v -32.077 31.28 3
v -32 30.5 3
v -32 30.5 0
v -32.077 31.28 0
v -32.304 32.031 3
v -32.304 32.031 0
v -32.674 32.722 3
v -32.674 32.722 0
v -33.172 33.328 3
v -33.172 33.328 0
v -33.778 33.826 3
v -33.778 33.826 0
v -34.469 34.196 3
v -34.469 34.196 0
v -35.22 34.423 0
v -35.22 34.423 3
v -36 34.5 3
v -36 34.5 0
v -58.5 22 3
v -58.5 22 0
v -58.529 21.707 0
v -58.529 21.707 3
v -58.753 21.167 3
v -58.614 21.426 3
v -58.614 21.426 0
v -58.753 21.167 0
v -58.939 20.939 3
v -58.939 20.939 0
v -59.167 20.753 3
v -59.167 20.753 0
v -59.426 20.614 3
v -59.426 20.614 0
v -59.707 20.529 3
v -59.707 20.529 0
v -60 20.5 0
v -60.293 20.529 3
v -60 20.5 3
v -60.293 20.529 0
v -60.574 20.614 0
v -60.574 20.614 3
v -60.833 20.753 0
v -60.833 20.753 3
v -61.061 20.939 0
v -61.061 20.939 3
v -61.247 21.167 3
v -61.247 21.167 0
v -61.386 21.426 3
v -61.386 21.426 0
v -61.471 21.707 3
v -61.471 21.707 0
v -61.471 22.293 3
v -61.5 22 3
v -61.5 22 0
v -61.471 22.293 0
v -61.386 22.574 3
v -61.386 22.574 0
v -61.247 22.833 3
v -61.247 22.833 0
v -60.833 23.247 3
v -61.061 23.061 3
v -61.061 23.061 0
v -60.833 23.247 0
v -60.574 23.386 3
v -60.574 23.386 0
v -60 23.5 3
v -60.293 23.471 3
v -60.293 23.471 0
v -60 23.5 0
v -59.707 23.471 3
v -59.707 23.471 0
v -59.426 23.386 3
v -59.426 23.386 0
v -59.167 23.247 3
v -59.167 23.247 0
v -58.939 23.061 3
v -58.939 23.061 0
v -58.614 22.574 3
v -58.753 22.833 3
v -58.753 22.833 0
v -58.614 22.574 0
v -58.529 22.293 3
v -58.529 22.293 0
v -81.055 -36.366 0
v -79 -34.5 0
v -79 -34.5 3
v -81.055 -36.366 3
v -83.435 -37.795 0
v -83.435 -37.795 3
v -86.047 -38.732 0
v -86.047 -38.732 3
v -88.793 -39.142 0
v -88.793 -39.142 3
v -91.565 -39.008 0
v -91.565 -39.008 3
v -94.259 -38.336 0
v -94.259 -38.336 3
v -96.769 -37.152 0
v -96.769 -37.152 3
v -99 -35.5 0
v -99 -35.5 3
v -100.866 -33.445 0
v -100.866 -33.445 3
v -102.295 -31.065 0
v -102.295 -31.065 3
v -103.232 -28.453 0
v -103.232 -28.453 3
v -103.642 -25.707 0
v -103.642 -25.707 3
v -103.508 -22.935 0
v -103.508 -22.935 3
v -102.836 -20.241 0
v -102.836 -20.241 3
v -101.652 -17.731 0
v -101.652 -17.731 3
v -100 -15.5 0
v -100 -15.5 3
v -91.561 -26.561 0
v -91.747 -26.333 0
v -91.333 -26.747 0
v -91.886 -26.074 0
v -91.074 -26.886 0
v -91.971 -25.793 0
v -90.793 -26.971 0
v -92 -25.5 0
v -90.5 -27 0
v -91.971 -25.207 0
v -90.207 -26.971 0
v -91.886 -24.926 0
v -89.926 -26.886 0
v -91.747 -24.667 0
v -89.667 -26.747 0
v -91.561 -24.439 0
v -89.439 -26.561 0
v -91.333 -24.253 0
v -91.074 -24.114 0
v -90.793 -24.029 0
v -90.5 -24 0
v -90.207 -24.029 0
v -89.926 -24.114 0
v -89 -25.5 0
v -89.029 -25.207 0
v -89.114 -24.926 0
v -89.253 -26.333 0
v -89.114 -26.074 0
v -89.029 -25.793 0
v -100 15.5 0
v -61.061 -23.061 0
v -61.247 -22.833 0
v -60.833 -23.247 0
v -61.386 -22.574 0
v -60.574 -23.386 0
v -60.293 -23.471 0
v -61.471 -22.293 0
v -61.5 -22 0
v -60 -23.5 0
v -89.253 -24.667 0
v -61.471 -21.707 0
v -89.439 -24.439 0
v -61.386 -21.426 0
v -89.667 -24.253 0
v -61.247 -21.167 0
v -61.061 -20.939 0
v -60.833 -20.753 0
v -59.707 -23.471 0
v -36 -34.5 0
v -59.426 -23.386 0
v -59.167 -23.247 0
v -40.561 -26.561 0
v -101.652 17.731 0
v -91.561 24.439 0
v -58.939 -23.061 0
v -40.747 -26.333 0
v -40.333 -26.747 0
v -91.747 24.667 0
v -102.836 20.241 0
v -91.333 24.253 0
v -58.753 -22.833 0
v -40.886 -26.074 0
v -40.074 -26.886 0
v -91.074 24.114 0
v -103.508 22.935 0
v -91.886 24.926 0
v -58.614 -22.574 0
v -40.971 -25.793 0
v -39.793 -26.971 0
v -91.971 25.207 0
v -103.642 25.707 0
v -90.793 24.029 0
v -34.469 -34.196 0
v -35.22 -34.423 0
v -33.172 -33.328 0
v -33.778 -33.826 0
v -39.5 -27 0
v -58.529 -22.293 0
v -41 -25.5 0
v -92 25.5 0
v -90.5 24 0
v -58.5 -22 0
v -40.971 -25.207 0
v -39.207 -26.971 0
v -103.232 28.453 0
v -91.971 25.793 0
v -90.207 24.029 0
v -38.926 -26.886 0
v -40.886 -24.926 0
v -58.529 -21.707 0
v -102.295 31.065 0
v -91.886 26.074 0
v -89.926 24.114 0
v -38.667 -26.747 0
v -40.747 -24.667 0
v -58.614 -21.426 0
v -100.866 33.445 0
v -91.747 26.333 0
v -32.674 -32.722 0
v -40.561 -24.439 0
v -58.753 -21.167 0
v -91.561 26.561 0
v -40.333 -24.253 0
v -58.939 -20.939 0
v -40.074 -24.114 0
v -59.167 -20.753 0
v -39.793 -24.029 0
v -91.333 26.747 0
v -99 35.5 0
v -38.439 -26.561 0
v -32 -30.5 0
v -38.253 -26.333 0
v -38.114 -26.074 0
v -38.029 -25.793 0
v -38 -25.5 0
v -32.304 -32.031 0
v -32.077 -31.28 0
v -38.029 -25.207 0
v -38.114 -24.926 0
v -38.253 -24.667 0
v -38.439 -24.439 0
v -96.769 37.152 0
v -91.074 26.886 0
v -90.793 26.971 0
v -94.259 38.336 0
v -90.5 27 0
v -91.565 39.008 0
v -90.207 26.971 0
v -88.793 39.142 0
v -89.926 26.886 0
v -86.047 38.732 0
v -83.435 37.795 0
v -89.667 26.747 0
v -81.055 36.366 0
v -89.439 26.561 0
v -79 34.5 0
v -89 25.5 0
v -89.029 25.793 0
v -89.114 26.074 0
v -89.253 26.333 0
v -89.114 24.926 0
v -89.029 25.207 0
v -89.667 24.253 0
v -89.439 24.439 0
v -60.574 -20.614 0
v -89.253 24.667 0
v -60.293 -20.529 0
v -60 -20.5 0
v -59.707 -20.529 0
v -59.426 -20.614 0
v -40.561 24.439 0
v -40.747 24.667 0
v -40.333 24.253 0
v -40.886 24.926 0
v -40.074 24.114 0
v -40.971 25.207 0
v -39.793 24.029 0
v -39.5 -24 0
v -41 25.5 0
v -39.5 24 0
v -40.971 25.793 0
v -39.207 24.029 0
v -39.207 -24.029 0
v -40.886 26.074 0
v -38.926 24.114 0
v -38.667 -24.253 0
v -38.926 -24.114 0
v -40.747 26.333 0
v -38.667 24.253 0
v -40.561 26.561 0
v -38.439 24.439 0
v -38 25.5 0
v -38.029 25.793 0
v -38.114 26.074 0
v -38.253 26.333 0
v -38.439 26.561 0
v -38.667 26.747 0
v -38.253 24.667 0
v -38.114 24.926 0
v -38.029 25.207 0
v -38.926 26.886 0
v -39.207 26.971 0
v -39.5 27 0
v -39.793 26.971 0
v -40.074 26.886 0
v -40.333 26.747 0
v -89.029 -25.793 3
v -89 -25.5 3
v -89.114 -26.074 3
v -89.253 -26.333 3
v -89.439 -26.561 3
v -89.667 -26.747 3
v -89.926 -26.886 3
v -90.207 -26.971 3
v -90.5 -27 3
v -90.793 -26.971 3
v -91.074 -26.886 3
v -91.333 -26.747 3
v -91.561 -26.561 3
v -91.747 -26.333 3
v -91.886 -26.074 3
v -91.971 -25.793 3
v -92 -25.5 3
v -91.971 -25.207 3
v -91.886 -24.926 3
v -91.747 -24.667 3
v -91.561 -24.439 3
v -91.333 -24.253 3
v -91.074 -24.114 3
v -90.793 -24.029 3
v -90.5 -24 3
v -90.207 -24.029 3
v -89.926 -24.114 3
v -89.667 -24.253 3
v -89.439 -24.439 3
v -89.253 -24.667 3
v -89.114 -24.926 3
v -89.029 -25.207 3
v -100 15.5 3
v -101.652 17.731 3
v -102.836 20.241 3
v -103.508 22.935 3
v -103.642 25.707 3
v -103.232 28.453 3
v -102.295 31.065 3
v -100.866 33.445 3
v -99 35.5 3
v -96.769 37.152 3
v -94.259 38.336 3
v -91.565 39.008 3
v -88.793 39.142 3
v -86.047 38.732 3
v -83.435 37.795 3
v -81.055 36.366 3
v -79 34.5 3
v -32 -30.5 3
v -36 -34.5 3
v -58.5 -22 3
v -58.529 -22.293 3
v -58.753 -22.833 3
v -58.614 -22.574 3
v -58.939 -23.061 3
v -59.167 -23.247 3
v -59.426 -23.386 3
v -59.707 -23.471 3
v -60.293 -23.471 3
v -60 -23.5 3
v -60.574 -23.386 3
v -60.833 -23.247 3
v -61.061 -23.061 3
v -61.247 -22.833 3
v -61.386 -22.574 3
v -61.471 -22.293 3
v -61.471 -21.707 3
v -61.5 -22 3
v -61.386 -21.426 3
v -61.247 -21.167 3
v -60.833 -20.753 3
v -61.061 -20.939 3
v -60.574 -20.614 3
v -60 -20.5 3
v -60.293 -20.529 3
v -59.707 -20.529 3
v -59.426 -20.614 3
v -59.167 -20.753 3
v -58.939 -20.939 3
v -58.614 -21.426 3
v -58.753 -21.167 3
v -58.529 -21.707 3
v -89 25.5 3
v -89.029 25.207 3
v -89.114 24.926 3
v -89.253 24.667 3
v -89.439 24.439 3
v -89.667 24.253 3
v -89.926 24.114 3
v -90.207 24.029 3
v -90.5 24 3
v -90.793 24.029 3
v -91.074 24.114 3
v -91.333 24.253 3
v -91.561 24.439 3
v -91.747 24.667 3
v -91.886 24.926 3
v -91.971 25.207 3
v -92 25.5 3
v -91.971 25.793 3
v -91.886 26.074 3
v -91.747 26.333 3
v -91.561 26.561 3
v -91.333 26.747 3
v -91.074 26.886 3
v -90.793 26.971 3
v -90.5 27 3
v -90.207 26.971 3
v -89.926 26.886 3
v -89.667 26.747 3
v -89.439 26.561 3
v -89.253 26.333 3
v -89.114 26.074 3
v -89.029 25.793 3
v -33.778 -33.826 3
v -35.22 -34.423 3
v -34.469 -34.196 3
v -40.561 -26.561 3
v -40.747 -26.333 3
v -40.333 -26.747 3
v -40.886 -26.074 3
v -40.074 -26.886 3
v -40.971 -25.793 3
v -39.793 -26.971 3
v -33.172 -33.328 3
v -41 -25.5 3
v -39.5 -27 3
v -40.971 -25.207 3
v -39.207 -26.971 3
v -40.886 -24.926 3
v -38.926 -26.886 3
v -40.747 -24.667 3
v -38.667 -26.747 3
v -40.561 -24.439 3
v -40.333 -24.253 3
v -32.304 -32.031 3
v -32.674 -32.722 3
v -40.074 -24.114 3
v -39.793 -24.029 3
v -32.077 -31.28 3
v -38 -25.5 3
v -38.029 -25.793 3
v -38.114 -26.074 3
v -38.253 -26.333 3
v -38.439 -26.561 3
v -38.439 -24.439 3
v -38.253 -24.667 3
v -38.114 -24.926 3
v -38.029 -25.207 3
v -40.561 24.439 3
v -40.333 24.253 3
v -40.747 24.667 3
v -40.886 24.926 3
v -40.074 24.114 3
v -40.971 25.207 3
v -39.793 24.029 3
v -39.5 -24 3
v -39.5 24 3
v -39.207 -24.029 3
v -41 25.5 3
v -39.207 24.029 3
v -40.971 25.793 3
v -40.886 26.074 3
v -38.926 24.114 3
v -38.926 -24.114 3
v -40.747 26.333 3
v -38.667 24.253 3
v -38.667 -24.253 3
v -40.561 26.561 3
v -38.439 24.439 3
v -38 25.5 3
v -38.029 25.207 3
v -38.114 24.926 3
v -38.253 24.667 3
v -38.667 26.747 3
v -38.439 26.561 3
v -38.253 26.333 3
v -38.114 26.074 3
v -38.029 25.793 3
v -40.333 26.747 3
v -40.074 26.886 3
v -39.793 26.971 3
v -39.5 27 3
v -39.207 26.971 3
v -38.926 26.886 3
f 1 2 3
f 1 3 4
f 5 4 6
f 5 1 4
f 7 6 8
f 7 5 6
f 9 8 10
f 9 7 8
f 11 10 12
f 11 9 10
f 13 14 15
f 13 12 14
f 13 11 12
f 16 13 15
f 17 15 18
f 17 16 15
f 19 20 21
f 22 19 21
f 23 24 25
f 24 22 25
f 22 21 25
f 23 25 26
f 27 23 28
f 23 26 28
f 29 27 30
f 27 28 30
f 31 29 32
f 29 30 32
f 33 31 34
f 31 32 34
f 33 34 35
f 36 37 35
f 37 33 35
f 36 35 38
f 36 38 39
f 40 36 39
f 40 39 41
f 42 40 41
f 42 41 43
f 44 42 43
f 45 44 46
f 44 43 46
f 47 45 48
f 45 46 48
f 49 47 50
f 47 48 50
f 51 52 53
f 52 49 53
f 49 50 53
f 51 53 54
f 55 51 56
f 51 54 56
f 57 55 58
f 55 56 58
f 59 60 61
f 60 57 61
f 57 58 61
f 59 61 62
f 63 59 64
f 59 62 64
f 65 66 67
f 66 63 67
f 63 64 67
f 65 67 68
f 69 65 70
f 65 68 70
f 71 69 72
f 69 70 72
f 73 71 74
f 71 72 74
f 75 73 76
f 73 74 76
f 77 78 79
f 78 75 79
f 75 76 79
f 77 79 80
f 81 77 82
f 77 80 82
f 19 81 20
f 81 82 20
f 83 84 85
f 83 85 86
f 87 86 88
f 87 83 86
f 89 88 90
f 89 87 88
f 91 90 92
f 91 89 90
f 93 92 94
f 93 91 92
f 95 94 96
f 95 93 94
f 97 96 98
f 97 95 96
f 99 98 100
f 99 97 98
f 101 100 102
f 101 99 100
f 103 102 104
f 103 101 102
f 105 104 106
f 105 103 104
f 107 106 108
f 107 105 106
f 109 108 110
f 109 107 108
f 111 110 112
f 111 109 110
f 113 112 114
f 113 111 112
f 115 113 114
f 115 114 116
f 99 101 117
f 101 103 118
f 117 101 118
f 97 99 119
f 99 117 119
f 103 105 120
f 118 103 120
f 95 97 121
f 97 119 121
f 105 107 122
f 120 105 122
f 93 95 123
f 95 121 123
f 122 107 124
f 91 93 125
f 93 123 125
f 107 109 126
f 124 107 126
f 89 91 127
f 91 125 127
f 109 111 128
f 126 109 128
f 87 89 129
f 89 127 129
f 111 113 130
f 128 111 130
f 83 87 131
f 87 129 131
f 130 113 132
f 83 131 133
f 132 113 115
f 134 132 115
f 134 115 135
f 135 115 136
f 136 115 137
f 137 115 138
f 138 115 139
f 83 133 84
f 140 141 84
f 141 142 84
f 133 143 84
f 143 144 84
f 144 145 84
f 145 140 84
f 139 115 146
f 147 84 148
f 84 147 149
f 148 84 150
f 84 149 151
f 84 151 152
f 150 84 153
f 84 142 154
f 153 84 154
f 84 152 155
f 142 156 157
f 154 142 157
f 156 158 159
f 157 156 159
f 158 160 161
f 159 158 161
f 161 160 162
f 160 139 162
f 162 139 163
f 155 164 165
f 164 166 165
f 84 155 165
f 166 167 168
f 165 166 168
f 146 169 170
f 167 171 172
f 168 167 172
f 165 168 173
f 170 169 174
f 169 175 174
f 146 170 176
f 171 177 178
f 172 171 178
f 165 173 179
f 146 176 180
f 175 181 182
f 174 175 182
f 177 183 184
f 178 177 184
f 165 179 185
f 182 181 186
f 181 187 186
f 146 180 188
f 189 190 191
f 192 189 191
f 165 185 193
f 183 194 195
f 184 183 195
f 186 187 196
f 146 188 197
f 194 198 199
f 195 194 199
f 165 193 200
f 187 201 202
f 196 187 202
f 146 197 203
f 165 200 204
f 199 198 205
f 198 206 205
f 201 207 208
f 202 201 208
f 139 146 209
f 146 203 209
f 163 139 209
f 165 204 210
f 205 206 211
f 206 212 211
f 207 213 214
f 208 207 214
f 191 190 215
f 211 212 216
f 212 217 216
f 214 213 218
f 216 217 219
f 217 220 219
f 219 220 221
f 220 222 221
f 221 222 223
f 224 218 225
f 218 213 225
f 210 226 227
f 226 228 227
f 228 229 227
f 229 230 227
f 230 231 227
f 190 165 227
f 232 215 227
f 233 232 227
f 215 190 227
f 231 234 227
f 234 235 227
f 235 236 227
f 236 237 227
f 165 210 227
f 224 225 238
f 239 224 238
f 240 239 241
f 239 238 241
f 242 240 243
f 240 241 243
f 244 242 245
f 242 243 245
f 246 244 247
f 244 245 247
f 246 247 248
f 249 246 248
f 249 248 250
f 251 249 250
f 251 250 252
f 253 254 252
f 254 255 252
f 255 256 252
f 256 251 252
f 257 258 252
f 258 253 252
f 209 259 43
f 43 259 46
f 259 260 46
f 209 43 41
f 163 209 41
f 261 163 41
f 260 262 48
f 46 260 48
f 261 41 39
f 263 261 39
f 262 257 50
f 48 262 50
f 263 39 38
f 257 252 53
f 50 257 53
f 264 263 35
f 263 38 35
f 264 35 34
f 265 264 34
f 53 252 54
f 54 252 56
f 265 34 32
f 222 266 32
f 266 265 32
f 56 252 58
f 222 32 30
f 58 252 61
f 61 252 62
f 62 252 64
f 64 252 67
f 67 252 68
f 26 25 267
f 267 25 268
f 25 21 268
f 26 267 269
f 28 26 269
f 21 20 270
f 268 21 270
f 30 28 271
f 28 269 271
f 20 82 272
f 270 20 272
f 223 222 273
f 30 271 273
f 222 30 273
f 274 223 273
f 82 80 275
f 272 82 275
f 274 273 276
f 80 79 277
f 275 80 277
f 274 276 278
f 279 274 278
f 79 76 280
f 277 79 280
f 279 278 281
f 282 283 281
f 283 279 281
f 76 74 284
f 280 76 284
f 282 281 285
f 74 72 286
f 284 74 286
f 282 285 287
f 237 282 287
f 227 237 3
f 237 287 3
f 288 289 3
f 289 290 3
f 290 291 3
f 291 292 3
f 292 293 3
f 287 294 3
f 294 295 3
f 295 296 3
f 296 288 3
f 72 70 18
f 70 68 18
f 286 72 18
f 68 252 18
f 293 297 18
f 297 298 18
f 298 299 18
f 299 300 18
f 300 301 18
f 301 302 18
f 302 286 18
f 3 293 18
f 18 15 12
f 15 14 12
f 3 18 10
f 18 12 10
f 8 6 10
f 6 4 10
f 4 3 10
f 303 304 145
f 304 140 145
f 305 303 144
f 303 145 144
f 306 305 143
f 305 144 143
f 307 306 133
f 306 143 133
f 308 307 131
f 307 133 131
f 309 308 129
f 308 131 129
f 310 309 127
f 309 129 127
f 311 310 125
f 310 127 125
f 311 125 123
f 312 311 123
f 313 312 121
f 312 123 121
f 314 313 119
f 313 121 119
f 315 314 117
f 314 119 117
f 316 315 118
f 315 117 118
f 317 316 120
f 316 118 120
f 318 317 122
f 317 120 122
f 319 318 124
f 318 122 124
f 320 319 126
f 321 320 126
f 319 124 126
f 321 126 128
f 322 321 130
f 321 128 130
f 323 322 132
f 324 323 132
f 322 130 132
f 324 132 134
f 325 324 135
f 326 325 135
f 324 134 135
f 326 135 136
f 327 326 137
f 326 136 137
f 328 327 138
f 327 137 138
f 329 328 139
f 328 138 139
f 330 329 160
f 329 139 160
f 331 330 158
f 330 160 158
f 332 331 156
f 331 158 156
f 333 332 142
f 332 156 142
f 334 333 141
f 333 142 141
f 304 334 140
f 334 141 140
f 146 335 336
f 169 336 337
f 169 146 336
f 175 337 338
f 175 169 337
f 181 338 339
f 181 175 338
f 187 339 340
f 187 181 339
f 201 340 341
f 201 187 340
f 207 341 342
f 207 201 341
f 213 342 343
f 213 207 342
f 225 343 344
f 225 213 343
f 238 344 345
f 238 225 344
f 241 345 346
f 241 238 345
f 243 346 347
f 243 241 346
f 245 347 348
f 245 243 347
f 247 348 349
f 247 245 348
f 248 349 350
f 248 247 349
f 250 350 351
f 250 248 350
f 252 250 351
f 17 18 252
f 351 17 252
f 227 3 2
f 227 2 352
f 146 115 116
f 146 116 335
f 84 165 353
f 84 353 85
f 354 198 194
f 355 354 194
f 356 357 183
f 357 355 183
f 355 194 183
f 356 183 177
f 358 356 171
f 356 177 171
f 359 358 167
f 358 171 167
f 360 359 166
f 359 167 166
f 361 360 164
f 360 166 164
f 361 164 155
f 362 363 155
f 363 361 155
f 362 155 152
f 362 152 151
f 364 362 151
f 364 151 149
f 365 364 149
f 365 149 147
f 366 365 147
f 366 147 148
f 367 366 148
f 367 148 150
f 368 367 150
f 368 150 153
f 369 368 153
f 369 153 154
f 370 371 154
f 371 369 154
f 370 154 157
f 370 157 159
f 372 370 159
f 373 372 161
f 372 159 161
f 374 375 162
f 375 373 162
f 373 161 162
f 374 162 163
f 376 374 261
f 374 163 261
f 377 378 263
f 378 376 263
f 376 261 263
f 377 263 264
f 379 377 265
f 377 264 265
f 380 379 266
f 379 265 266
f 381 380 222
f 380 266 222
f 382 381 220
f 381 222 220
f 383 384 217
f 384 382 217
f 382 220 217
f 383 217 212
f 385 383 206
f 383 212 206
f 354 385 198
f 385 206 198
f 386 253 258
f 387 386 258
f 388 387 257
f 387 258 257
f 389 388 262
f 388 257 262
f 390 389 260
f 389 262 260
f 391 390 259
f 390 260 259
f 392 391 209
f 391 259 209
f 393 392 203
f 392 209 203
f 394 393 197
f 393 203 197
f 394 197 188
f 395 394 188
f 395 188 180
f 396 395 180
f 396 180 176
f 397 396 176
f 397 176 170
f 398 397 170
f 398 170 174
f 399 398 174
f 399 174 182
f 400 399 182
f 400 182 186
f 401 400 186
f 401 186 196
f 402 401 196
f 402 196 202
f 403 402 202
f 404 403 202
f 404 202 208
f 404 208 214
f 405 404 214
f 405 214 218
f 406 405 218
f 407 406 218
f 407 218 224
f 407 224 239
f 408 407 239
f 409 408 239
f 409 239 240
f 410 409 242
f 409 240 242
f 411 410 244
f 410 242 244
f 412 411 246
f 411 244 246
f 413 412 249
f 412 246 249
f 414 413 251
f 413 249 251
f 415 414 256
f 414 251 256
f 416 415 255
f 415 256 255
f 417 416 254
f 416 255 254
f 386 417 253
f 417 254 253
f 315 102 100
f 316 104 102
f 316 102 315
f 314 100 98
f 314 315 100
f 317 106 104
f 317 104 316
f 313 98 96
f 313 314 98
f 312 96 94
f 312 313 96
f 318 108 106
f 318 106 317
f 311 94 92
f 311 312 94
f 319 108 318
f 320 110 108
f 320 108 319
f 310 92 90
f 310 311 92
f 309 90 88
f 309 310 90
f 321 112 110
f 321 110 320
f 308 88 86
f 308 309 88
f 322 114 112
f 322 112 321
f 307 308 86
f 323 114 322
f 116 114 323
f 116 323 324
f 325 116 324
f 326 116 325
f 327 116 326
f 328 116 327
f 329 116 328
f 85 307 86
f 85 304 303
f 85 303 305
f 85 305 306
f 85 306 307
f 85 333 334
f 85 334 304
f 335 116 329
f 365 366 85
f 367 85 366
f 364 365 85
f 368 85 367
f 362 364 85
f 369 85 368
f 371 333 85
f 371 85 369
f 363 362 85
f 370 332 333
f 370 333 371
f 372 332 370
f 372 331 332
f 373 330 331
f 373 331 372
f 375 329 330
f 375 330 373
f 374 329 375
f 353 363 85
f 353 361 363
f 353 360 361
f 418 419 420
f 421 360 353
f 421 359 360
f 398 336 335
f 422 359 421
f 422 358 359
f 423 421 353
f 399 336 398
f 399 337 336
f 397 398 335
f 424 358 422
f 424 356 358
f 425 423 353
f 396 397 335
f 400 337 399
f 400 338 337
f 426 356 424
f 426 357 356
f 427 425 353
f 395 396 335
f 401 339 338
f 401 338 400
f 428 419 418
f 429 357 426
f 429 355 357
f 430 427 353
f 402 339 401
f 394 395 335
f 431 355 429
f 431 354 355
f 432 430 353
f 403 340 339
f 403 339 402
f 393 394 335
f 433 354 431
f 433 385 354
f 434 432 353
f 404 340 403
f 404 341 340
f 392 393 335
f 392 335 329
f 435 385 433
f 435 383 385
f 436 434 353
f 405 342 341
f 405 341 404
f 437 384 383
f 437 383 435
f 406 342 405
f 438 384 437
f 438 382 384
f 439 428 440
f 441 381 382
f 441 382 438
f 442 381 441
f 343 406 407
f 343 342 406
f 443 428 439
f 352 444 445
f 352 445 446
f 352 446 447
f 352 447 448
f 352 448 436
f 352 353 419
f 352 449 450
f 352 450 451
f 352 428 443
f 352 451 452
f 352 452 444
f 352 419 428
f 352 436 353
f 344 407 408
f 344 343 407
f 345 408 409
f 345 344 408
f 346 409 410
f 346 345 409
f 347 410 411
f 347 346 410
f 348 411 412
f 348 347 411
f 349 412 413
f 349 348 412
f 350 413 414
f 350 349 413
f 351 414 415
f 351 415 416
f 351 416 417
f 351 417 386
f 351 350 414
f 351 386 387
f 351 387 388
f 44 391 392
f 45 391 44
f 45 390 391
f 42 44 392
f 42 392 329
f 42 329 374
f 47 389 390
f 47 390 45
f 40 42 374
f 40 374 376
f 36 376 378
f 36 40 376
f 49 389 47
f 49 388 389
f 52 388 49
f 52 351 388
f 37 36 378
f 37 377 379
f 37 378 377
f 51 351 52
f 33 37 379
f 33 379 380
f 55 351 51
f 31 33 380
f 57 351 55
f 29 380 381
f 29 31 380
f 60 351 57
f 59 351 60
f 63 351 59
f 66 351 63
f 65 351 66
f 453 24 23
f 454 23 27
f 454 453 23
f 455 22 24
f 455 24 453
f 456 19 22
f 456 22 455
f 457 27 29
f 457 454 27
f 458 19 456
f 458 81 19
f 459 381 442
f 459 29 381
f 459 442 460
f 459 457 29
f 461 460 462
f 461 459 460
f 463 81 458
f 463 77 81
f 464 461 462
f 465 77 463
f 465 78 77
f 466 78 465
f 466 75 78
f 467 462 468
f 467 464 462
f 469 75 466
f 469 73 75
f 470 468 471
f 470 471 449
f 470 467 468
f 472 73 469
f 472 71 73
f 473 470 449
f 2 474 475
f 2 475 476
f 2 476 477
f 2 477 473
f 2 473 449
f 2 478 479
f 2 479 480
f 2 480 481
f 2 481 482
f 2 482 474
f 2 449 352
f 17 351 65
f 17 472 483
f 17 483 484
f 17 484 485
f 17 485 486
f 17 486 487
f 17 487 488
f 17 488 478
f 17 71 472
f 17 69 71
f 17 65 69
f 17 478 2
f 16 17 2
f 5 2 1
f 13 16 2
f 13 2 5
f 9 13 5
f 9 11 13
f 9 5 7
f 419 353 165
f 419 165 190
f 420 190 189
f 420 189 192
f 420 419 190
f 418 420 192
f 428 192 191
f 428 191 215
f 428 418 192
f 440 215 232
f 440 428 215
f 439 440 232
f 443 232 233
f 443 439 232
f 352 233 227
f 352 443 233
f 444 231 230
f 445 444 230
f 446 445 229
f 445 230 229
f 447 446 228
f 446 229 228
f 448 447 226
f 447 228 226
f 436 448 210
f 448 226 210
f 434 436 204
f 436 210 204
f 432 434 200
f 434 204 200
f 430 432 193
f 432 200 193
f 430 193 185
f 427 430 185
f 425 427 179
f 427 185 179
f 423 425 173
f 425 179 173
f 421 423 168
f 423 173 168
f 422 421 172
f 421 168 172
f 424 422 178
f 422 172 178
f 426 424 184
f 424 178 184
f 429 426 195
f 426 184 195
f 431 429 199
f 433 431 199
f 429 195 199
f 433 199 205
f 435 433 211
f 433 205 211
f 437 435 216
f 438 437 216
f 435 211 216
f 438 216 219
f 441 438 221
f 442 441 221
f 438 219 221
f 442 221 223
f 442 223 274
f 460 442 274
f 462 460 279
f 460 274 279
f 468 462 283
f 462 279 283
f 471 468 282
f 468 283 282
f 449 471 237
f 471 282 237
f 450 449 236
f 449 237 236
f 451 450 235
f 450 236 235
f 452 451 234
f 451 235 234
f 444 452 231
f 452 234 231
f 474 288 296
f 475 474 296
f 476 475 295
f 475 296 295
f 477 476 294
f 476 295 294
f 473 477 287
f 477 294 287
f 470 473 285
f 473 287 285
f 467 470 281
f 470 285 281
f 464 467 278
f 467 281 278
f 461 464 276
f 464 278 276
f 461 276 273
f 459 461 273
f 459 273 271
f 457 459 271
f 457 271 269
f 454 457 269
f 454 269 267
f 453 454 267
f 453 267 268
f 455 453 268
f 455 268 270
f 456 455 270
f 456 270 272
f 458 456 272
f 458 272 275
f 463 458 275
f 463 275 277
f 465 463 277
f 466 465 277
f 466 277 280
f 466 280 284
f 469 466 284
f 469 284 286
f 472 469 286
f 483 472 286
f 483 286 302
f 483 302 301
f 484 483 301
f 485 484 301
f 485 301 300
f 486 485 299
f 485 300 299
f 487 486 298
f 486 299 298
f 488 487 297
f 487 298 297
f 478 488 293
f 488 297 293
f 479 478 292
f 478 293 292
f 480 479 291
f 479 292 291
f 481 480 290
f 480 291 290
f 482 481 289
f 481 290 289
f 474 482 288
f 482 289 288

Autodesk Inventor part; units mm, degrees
ref_plane "YZ Plane" through (0, 0, 0) normal (1, 0, 0) x (0, 1, 0)
ref_plane "XZ Plane" through (0, 0, 0) normal (0, 1, 0) x (-1, 0, 0)
ref_plane "XY Plane" through (0, 0, 0) normal (0, 0, 1) x (1, 0, 0)
sketch "Sketch1" plane through (0, 0, 0) normal (0, 0, 1) x (1, 0, 0)
  point P0 (0, 0)
sketch "Sketch2" plane through (0, 0, 0) normal (0, 0, 1) x (1, 0, 0)
  line L0 (-100, -34.5) -> (-100, 34.5)
  circle A0 centre (-60, 22) radius 1.4998
  circle A1 centre (-60, -22) radius 1.4998
  circle A2 centre (-89.5, 25) radius 14.1598
  circle A3 centre (-89.5, -25) radius 14.1598
  line L1 (-32, 34.5) -> (-32, -34.5)
  line L2 (-32, 34.5) -> (-100, 34.5)
  line L3 (-32, -34.5) -> (-100, -34.5)
  circle A4 centre (-90.5, 25.5) radius 1.5
  circle A5 centre (-90.5, -25.5) radius 1.5
  circle A6 centre (-39.5, 25.5) radius 1.5
  circle A7 centre (-39.5, -25.5) radius 1.5
  point P0 (-100, 15.5)
  point P1 (-100, -15.5)
  point P2 (-79, -34.5)
  point P3 (-79, 34.5)
extrude "Extrusion1" add sketch "Sketch2" along normal blind 3 contours A3 L0 | L3 A3 | L0 A3 L3 | L0 A2 L2 L1 L3 A3 | A2 L0 | L0 L2 A2 | A2 L2 | A4 | A5 | A6 | A7
fillet "Fillet2" radius 4 2 edges at (-32, 34.5, 1.5) (-32, -34.5, 1.5)
extrude "Extrusion2" cut sketch "Sketch2" along normal blind 10 contours A4 | A5 | A6 | A7
properties part number "Power Distribution Board redo v2" material "CFRP"
